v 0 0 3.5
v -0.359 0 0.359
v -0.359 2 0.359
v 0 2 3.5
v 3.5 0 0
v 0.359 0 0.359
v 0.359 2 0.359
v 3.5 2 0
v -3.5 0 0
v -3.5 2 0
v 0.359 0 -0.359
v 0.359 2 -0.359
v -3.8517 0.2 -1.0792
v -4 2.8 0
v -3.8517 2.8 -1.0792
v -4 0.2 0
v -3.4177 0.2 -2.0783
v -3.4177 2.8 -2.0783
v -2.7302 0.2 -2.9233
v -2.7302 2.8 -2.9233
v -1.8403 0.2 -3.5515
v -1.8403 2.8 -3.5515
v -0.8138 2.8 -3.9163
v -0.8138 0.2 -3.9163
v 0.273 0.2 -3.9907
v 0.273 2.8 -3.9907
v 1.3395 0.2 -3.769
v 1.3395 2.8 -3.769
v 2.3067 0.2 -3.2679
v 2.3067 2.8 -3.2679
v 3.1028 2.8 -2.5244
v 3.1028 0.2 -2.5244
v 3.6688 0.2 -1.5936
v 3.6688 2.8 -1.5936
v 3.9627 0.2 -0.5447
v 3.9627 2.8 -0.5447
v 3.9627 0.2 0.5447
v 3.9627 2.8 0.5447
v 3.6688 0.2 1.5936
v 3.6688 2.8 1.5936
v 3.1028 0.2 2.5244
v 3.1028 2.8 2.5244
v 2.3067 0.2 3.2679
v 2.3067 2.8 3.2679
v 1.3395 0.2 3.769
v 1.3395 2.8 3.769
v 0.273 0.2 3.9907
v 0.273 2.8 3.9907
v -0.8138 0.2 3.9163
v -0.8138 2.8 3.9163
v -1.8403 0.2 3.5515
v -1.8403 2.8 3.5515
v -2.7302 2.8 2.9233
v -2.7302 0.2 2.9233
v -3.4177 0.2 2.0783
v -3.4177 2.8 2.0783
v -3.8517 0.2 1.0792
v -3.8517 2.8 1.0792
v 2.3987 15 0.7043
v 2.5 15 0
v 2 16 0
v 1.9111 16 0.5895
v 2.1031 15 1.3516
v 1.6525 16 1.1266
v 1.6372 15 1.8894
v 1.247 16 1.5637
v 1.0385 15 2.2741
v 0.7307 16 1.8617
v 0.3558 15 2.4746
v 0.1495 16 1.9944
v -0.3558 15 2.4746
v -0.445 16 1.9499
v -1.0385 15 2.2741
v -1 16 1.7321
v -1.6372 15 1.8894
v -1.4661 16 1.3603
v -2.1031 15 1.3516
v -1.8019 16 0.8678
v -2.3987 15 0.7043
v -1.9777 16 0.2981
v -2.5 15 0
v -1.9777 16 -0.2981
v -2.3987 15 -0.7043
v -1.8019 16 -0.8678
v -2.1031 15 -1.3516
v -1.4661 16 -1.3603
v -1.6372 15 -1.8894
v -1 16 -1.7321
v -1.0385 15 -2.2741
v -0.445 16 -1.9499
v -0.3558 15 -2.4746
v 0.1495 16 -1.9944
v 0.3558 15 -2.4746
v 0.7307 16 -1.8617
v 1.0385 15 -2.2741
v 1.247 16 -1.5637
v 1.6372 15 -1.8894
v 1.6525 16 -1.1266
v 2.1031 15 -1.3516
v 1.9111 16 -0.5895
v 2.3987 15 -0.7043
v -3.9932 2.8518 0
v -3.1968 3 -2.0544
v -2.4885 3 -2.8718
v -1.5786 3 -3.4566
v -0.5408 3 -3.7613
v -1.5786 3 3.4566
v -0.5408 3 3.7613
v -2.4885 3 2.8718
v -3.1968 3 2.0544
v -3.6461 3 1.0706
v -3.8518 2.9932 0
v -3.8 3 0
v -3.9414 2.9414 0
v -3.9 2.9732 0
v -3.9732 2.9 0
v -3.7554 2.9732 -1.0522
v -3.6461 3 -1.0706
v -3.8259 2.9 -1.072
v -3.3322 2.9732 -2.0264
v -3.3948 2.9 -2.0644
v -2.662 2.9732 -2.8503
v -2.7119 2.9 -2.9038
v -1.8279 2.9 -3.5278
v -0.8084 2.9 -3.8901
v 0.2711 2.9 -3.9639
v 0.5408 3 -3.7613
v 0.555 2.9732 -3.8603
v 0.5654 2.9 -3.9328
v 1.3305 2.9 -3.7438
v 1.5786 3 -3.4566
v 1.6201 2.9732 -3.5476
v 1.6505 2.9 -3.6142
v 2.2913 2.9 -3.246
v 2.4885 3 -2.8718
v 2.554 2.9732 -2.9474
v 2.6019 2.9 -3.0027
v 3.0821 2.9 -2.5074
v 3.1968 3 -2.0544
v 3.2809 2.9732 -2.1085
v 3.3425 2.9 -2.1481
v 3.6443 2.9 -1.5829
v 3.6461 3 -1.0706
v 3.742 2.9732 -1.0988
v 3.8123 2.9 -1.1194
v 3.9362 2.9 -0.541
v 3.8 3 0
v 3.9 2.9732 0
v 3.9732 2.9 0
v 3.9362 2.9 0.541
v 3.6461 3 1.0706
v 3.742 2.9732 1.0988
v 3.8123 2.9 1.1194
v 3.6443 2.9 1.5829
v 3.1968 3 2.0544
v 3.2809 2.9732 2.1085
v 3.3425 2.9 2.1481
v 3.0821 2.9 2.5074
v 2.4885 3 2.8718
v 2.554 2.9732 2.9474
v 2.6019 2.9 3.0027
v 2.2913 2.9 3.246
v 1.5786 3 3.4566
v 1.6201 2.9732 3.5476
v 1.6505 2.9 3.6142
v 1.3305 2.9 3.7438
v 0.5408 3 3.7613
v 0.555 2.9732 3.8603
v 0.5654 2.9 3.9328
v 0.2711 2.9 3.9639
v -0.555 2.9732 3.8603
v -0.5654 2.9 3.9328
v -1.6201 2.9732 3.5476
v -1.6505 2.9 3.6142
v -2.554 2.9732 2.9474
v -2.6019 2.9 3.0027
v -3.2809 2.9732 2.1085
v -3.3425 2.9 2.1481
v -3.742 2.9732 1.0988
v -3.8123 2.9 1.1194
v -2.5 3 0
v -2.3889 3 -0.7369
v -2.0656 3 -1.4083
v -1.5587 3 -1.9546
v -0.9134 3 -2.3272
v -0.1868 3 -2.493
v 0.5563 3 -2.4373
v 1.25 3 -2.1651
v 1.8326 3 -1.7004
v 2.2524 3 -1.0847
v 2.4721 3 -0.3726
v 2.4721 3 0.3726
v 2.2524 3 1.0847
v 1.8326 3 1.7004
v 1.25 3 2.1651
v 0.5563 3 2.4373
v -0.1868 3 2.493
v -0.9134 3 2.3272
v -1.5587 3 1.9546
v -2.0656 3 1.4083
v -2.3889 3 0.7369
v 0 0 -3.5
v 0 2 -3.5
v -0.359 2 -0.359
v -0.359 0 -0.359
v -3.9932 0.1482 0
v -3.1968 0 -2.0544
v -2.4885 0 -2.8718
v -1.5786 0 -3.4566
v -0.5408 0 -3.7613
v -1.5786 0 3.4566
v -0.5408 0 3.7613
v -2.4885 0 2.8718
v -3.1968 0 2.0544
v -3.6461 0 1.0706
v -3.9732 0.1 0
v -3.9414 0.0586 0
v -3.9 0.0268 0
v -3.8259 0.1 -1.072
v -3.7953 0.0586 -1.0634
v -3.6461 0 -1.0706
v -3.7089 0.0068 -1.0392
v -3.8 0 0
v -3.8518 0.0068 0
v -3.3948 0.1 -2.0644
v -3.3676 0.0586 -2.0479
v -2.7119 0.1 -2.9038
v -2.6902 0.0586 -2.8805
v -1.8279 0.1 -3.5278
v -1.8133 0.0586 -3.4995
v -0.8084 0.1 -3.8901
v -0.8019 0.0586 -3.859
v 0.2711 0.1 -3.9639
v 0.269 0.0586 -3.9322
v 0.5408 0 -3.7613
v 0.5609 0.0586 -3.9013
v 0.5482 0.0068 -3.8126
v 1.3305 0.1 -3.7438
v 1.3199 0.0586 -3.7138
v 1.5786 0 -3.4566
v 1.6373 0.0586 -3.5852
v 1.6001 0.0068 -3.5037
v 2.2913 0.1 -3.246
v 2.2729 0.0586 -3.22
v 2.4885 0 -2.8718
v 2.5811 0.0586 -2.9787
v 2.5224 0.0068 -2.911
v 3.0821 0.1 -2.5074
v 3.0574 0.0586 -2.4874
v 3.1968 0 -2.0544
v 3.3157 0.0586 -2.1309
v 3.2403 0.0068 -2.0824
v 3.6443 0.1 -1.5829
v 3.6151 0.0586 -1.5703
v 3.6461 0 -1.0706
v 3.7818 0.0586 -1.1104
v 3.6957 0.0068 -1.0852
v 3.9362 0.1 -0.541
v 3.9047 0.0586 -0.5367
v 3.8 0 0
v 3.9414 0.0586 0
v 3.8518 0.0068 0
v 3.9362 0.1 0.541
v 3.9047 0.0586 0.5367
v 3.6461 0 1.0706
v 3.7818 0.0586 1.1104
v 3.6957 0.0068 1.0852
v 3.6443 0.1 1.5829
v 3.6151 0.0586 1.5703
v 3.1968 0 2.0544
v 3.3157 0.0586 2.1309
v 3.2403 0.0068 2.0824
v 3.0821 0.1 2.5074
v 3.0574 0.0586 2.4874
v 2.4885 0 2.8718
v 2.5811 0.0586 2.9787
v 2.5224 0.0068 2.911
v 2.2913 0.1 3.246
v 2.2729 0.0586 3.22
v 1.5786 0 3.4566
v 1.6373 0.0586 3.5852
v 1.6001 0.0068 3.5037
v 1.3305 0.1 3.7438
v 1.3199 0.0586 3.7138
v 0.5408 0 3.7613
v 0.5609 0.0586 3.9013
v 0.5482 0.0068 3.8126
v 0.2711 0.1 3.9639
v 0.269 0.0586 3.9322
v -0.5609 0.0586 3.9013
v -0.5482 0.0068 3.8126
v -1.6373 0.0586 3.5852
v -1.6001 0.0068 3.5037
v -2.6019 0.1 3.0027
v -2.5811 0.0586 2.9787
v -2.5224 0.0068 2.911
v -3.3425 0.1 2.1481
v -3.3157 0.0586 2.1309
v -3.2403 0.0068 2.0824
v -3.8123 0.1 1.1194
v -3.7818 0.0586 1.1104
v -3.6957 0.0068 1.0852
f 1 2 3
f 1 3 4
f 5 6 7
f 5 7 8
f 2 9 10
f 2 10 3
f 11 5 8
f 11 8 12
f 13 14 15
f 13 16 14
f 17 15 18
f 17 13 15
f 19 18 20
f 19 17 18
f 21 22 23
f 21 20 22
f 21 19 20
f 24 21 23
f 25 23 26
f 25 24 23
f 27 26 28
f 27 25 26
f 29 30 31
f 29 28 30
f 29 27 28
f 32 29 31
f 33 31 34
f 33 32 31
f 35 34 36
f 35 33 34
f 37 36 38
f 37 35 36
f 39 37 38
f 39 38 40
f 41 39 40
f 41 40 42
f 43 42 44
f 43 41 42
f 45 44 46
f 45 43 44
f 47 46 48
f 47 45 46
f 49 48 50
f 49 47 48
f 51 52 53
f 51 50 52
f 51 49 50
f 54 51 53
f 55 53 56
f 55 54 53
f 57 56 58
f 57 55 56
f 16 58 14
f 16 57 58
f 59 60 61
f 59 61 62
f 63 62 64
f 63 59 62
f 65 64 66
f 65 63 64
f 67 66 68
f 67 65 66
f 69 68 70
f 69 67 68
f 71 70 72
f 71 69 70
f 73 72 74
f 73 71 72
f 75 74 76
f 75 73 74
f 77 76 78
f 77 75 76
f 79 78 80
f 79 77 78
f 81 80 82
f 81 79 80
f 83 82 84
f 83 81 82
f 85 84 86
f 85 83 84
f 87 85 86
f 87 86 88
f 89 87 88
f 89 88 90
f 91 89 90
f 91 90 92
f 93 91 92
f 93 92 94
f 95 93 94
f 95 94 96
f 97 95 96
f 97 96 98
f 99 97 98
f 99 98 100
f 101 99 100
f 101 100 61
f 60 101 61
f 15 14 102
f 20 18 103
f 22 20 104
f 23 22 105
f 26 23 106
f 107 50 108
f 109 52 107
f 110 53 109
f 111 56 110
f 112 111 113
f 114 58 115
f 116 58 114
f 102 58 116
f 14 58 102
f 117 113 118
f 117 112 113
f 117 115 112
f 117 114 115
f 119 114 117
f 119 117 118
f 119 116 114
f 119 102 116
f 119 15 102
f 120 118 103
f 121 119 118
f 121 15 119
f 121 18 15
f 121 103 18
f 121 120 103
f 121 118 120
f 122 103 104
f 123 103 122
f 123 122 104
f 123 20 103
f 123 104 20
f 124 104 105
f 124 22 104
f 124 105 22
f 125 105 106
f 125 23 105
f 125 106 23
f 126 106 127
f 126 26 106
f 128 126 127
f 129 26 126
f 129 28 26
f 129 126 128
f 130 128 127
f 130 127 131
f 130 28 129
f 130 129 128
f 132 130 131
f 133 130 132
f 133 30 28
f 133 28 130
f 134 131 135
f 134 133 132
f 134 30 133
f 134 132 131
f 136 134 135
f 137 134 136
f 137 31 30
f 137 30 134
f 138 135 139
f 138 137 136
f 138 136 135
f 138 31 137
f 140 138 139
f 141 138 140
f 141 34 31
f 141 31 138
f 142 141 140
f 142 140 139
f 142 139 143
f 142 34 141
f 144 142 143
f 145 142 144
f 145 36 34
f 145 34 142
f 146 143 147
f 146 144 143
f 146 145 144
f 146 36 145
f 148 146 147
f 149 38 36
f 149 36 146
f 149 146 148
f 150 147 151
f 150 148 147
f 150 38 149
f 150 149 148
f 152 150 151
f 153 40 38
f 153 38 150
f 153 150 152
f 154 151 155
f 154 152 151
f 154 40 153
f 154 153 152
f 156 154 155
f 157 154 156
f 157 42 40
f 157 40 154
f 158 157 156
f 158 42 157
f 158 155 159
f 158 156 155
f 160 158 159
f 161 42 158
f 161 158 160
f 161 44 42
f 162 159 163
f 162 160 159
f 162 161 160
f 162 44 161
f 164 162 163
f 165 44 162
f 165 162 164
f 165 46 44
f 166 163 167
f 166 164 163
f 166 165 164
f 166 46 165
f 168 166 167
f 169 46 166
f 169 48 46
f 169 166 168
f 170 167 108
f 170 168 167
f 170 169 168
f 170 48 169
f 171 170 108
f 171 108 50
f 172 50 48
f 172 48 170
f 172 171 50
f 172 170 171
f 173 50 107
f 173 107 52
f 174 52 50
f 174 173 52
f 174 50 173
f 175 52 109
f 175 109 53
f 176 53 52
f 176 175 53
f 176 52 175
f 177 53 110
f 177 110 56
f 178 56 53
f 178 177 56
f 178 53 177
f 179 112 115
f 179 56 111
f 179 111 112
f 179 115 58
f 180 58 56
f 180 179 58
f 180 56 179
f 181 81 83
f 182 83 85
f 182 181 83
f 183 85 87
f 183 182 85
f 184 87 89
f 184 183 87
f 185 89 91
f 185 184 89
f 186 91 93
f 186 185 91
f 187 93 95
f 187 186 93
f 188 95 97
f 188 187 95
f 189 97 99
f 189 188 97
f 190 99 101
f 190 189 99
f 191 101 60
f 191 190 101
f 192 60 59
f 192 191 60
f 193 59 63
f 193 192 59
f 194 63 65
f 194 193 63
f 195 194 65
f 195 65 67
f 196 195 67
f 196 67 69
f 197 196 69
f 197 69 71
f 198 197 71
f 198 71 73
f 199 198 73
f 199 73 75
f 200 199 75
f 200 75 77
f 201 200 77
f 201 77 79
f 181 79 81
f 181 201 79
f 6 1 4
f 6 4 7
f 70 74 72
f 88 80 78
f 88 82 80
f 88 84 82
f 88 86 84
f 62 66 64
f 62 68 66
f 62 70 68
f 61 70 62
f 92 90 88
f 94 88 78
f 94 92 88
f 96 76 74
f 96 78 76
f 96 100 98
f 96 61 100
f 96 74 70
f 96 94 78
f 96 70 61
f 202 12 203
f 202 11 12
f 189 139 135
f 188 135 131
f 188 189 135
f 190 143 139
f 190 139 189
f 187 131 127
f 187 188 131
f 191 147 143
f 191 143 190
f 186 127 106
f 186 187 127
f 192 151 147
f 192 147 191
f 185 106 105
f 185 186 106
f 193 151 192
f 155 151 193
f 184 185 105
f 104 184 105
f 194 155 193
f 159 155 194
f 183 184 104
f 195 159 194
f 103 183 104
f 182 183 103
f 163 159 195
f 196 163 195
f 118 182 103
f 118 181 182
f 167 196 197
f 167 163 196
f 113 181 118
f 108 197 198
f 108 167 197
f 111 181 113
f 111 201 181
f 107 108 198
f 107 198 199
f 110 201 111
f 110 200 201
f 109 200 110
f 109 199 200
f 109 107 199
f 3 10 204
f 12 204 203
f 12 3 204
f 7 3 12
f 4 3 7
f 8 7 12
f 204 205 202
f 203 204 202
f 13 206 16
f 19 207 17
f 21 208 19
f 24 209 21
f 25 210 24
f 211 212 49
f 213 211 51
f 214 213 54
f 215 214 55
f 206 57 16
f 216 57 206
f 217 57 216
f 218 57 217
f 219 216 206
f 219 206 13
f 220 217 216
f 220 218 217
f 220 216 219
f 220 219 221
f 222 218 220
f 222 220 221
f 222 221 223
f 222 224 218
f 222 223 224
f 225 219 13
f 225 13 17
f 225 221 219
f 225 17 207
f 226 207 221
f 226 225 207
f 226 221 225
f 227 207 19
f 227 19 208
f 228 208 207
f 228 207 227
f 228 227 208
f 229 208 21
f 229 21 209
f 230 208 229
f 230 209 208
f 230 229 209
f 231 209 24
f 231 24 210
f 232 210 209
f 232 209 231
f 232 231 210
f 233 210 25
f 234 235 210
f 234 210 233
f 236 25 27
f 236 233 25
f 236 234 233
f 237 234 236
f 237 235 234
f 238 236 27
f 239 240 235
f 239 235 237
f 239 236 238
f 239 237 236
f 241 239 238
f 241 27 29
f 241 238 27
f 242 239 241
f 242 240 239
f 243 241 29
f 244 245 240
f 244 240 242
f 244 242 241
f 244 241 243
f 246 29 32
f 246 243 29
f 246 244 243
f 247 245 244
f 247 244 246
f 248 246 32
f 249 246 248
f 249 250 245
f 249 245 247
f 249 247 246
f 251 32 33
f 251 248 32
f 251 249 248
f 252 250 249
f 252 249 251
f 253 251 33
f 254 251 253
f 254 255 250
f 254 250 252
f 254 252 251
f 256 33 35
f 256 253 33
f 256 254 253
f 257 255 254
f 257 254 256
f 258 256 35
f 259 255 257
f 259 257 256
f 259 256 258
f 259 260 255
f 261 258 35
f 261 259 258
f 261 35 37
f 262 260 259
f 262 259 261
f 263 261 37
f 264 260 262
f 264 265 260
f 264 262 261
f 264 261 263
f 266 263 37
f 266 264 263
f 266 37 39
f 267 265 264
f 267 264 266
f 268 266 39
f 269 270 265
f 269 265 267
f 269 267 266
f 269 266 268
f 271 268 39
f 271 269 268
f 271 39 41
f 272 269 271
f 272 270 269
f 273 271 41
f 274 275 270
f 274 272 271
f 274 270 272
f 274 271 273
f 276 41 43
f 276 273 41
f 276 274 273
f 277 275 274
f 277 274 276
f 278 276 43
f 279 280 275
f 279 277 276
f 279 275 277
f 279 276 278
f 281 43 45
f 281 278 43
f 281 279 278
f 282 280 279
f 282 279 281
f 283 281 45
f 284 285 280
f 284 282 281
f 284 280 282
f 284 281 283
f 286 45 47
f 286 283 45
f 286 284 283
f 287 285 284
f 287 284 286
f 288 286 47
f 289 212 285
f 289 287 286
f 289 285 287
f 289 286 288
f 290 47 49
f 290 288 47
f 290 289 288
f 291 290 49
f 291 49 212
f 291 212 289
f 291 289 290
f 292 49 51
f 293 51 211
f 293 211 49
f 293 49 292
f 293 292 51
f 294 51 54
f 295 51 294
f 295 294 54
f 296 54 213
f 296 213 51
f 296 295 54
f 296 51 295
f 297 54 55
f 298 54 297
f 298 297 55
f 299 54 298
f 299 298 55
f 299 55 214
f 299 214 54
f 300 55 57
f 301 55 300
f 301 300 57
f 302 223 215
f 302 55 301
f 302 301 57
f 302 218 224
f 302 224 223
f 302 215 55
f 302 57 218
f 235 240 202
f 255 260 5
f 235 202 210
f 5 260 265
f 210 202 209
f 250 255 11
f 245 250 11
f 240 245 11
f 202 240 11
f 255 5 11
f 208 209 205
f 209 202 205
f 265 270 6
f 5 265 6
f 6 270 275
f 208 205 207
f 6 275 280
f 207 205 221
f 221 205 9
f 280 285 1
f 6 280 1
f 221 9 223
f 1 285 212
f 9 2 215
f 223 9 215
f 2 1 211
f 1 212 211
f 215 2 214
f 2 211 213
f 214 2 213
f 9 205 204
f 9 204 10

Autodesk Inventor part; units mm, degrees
ref_plane "YZ Plane" through (0, 0, 0) normal (1, 0, 0) x (0, 1, 0)
ref_plane "XZ Plane" through (0, 0, 0) normal (0, 1, 0) x (-1, 0, 0)
ref_plane "XY Plane" through (0, 0, 0) normal (0, 0, 1) x (1, 0, 0)
sketch "Sketch1" plane through (0, 0, 0) normal (0, 1, 0) x (-1, 0, 0)
  circle A0 centre (0, 0) radius 2.5
  circle A1 centre (0, 0) radius 4
  dimension "d0" = 5
  dimension "d1" = 8
extrude "Extrusion1" add sketch "Sketch1" along normal blind 15 contours A0
extrude "Extrusion2" add sketch "Sketch1" along normal blind 3
sketch "Sketch3" plane through (0, 0, 0) normal (0, -1, 0) x (1, 0, 0)
  line L0 (0, 0) -> (0, -0.4) construction
  circle A0 centre (0, 0) radius 4 projected
  line L1 (4, 0) -> (3.5, 0) construction
  line L2 (0, 0) -> (0, 0.4) construction
  line L3 (0.359, 0.359) -> (3.5, 0)
  line L4 (3.5, 0) -> (0.359, -0.359)
  line L5 (0.359, -0.359) -> (0, -3.5)
  line L6 (-0.359, -0.359) -> (0, -3.5)
  line L7 (-0.359, -0.359) -> (-3.5, 0)
  line L8 (-3.5, 0) -> (-0.359, 0.359)
  line L9 (-0.359, 0.359) -> (0, 3.5)
  line L10 (0, 3.5) -> (0.359, 0.359)
  dimension "d14" = 0.4
  dimension "d15" = 0.5
  dimension "d16" = 0.4
  dimension "d21" = 103.04
  dimension "d22" = 103.04
  dimension "d23" = 13.04
  dimension "d24" = 3.1615
  dimension "d25" = 3.1615
extrude "Extrusion3" cut sketch "Sketch3" against normal blind 2 contours L3 L4 L5 L6 L7 L8 L9 L10
fillet "Fillet1" radius 0.2 2 edges at (4, 0, 0) (4, 3, 0)
thread "Thread1" size "M5x0.8" class "6g" standard "ANSI Metric M Profile" full length
sketch "Sketch4" plane through (0, 15, 0) normal (0, 1, 0) x (1, 0, 0)
  circle A0 centre (0, 0) radius 2
  dimension "d31" = 4
extrude "Extrusion4" add sketch "Sketch4" along normal blind 1
loft "Loft1" add section 1 edges at (-2, 16, 0) section 2 edges at (2.5, 15, 0)
thread "Thread2" size "R 5" standard "ISO Taper" full length
properties part number "m5x12mmscrew"
